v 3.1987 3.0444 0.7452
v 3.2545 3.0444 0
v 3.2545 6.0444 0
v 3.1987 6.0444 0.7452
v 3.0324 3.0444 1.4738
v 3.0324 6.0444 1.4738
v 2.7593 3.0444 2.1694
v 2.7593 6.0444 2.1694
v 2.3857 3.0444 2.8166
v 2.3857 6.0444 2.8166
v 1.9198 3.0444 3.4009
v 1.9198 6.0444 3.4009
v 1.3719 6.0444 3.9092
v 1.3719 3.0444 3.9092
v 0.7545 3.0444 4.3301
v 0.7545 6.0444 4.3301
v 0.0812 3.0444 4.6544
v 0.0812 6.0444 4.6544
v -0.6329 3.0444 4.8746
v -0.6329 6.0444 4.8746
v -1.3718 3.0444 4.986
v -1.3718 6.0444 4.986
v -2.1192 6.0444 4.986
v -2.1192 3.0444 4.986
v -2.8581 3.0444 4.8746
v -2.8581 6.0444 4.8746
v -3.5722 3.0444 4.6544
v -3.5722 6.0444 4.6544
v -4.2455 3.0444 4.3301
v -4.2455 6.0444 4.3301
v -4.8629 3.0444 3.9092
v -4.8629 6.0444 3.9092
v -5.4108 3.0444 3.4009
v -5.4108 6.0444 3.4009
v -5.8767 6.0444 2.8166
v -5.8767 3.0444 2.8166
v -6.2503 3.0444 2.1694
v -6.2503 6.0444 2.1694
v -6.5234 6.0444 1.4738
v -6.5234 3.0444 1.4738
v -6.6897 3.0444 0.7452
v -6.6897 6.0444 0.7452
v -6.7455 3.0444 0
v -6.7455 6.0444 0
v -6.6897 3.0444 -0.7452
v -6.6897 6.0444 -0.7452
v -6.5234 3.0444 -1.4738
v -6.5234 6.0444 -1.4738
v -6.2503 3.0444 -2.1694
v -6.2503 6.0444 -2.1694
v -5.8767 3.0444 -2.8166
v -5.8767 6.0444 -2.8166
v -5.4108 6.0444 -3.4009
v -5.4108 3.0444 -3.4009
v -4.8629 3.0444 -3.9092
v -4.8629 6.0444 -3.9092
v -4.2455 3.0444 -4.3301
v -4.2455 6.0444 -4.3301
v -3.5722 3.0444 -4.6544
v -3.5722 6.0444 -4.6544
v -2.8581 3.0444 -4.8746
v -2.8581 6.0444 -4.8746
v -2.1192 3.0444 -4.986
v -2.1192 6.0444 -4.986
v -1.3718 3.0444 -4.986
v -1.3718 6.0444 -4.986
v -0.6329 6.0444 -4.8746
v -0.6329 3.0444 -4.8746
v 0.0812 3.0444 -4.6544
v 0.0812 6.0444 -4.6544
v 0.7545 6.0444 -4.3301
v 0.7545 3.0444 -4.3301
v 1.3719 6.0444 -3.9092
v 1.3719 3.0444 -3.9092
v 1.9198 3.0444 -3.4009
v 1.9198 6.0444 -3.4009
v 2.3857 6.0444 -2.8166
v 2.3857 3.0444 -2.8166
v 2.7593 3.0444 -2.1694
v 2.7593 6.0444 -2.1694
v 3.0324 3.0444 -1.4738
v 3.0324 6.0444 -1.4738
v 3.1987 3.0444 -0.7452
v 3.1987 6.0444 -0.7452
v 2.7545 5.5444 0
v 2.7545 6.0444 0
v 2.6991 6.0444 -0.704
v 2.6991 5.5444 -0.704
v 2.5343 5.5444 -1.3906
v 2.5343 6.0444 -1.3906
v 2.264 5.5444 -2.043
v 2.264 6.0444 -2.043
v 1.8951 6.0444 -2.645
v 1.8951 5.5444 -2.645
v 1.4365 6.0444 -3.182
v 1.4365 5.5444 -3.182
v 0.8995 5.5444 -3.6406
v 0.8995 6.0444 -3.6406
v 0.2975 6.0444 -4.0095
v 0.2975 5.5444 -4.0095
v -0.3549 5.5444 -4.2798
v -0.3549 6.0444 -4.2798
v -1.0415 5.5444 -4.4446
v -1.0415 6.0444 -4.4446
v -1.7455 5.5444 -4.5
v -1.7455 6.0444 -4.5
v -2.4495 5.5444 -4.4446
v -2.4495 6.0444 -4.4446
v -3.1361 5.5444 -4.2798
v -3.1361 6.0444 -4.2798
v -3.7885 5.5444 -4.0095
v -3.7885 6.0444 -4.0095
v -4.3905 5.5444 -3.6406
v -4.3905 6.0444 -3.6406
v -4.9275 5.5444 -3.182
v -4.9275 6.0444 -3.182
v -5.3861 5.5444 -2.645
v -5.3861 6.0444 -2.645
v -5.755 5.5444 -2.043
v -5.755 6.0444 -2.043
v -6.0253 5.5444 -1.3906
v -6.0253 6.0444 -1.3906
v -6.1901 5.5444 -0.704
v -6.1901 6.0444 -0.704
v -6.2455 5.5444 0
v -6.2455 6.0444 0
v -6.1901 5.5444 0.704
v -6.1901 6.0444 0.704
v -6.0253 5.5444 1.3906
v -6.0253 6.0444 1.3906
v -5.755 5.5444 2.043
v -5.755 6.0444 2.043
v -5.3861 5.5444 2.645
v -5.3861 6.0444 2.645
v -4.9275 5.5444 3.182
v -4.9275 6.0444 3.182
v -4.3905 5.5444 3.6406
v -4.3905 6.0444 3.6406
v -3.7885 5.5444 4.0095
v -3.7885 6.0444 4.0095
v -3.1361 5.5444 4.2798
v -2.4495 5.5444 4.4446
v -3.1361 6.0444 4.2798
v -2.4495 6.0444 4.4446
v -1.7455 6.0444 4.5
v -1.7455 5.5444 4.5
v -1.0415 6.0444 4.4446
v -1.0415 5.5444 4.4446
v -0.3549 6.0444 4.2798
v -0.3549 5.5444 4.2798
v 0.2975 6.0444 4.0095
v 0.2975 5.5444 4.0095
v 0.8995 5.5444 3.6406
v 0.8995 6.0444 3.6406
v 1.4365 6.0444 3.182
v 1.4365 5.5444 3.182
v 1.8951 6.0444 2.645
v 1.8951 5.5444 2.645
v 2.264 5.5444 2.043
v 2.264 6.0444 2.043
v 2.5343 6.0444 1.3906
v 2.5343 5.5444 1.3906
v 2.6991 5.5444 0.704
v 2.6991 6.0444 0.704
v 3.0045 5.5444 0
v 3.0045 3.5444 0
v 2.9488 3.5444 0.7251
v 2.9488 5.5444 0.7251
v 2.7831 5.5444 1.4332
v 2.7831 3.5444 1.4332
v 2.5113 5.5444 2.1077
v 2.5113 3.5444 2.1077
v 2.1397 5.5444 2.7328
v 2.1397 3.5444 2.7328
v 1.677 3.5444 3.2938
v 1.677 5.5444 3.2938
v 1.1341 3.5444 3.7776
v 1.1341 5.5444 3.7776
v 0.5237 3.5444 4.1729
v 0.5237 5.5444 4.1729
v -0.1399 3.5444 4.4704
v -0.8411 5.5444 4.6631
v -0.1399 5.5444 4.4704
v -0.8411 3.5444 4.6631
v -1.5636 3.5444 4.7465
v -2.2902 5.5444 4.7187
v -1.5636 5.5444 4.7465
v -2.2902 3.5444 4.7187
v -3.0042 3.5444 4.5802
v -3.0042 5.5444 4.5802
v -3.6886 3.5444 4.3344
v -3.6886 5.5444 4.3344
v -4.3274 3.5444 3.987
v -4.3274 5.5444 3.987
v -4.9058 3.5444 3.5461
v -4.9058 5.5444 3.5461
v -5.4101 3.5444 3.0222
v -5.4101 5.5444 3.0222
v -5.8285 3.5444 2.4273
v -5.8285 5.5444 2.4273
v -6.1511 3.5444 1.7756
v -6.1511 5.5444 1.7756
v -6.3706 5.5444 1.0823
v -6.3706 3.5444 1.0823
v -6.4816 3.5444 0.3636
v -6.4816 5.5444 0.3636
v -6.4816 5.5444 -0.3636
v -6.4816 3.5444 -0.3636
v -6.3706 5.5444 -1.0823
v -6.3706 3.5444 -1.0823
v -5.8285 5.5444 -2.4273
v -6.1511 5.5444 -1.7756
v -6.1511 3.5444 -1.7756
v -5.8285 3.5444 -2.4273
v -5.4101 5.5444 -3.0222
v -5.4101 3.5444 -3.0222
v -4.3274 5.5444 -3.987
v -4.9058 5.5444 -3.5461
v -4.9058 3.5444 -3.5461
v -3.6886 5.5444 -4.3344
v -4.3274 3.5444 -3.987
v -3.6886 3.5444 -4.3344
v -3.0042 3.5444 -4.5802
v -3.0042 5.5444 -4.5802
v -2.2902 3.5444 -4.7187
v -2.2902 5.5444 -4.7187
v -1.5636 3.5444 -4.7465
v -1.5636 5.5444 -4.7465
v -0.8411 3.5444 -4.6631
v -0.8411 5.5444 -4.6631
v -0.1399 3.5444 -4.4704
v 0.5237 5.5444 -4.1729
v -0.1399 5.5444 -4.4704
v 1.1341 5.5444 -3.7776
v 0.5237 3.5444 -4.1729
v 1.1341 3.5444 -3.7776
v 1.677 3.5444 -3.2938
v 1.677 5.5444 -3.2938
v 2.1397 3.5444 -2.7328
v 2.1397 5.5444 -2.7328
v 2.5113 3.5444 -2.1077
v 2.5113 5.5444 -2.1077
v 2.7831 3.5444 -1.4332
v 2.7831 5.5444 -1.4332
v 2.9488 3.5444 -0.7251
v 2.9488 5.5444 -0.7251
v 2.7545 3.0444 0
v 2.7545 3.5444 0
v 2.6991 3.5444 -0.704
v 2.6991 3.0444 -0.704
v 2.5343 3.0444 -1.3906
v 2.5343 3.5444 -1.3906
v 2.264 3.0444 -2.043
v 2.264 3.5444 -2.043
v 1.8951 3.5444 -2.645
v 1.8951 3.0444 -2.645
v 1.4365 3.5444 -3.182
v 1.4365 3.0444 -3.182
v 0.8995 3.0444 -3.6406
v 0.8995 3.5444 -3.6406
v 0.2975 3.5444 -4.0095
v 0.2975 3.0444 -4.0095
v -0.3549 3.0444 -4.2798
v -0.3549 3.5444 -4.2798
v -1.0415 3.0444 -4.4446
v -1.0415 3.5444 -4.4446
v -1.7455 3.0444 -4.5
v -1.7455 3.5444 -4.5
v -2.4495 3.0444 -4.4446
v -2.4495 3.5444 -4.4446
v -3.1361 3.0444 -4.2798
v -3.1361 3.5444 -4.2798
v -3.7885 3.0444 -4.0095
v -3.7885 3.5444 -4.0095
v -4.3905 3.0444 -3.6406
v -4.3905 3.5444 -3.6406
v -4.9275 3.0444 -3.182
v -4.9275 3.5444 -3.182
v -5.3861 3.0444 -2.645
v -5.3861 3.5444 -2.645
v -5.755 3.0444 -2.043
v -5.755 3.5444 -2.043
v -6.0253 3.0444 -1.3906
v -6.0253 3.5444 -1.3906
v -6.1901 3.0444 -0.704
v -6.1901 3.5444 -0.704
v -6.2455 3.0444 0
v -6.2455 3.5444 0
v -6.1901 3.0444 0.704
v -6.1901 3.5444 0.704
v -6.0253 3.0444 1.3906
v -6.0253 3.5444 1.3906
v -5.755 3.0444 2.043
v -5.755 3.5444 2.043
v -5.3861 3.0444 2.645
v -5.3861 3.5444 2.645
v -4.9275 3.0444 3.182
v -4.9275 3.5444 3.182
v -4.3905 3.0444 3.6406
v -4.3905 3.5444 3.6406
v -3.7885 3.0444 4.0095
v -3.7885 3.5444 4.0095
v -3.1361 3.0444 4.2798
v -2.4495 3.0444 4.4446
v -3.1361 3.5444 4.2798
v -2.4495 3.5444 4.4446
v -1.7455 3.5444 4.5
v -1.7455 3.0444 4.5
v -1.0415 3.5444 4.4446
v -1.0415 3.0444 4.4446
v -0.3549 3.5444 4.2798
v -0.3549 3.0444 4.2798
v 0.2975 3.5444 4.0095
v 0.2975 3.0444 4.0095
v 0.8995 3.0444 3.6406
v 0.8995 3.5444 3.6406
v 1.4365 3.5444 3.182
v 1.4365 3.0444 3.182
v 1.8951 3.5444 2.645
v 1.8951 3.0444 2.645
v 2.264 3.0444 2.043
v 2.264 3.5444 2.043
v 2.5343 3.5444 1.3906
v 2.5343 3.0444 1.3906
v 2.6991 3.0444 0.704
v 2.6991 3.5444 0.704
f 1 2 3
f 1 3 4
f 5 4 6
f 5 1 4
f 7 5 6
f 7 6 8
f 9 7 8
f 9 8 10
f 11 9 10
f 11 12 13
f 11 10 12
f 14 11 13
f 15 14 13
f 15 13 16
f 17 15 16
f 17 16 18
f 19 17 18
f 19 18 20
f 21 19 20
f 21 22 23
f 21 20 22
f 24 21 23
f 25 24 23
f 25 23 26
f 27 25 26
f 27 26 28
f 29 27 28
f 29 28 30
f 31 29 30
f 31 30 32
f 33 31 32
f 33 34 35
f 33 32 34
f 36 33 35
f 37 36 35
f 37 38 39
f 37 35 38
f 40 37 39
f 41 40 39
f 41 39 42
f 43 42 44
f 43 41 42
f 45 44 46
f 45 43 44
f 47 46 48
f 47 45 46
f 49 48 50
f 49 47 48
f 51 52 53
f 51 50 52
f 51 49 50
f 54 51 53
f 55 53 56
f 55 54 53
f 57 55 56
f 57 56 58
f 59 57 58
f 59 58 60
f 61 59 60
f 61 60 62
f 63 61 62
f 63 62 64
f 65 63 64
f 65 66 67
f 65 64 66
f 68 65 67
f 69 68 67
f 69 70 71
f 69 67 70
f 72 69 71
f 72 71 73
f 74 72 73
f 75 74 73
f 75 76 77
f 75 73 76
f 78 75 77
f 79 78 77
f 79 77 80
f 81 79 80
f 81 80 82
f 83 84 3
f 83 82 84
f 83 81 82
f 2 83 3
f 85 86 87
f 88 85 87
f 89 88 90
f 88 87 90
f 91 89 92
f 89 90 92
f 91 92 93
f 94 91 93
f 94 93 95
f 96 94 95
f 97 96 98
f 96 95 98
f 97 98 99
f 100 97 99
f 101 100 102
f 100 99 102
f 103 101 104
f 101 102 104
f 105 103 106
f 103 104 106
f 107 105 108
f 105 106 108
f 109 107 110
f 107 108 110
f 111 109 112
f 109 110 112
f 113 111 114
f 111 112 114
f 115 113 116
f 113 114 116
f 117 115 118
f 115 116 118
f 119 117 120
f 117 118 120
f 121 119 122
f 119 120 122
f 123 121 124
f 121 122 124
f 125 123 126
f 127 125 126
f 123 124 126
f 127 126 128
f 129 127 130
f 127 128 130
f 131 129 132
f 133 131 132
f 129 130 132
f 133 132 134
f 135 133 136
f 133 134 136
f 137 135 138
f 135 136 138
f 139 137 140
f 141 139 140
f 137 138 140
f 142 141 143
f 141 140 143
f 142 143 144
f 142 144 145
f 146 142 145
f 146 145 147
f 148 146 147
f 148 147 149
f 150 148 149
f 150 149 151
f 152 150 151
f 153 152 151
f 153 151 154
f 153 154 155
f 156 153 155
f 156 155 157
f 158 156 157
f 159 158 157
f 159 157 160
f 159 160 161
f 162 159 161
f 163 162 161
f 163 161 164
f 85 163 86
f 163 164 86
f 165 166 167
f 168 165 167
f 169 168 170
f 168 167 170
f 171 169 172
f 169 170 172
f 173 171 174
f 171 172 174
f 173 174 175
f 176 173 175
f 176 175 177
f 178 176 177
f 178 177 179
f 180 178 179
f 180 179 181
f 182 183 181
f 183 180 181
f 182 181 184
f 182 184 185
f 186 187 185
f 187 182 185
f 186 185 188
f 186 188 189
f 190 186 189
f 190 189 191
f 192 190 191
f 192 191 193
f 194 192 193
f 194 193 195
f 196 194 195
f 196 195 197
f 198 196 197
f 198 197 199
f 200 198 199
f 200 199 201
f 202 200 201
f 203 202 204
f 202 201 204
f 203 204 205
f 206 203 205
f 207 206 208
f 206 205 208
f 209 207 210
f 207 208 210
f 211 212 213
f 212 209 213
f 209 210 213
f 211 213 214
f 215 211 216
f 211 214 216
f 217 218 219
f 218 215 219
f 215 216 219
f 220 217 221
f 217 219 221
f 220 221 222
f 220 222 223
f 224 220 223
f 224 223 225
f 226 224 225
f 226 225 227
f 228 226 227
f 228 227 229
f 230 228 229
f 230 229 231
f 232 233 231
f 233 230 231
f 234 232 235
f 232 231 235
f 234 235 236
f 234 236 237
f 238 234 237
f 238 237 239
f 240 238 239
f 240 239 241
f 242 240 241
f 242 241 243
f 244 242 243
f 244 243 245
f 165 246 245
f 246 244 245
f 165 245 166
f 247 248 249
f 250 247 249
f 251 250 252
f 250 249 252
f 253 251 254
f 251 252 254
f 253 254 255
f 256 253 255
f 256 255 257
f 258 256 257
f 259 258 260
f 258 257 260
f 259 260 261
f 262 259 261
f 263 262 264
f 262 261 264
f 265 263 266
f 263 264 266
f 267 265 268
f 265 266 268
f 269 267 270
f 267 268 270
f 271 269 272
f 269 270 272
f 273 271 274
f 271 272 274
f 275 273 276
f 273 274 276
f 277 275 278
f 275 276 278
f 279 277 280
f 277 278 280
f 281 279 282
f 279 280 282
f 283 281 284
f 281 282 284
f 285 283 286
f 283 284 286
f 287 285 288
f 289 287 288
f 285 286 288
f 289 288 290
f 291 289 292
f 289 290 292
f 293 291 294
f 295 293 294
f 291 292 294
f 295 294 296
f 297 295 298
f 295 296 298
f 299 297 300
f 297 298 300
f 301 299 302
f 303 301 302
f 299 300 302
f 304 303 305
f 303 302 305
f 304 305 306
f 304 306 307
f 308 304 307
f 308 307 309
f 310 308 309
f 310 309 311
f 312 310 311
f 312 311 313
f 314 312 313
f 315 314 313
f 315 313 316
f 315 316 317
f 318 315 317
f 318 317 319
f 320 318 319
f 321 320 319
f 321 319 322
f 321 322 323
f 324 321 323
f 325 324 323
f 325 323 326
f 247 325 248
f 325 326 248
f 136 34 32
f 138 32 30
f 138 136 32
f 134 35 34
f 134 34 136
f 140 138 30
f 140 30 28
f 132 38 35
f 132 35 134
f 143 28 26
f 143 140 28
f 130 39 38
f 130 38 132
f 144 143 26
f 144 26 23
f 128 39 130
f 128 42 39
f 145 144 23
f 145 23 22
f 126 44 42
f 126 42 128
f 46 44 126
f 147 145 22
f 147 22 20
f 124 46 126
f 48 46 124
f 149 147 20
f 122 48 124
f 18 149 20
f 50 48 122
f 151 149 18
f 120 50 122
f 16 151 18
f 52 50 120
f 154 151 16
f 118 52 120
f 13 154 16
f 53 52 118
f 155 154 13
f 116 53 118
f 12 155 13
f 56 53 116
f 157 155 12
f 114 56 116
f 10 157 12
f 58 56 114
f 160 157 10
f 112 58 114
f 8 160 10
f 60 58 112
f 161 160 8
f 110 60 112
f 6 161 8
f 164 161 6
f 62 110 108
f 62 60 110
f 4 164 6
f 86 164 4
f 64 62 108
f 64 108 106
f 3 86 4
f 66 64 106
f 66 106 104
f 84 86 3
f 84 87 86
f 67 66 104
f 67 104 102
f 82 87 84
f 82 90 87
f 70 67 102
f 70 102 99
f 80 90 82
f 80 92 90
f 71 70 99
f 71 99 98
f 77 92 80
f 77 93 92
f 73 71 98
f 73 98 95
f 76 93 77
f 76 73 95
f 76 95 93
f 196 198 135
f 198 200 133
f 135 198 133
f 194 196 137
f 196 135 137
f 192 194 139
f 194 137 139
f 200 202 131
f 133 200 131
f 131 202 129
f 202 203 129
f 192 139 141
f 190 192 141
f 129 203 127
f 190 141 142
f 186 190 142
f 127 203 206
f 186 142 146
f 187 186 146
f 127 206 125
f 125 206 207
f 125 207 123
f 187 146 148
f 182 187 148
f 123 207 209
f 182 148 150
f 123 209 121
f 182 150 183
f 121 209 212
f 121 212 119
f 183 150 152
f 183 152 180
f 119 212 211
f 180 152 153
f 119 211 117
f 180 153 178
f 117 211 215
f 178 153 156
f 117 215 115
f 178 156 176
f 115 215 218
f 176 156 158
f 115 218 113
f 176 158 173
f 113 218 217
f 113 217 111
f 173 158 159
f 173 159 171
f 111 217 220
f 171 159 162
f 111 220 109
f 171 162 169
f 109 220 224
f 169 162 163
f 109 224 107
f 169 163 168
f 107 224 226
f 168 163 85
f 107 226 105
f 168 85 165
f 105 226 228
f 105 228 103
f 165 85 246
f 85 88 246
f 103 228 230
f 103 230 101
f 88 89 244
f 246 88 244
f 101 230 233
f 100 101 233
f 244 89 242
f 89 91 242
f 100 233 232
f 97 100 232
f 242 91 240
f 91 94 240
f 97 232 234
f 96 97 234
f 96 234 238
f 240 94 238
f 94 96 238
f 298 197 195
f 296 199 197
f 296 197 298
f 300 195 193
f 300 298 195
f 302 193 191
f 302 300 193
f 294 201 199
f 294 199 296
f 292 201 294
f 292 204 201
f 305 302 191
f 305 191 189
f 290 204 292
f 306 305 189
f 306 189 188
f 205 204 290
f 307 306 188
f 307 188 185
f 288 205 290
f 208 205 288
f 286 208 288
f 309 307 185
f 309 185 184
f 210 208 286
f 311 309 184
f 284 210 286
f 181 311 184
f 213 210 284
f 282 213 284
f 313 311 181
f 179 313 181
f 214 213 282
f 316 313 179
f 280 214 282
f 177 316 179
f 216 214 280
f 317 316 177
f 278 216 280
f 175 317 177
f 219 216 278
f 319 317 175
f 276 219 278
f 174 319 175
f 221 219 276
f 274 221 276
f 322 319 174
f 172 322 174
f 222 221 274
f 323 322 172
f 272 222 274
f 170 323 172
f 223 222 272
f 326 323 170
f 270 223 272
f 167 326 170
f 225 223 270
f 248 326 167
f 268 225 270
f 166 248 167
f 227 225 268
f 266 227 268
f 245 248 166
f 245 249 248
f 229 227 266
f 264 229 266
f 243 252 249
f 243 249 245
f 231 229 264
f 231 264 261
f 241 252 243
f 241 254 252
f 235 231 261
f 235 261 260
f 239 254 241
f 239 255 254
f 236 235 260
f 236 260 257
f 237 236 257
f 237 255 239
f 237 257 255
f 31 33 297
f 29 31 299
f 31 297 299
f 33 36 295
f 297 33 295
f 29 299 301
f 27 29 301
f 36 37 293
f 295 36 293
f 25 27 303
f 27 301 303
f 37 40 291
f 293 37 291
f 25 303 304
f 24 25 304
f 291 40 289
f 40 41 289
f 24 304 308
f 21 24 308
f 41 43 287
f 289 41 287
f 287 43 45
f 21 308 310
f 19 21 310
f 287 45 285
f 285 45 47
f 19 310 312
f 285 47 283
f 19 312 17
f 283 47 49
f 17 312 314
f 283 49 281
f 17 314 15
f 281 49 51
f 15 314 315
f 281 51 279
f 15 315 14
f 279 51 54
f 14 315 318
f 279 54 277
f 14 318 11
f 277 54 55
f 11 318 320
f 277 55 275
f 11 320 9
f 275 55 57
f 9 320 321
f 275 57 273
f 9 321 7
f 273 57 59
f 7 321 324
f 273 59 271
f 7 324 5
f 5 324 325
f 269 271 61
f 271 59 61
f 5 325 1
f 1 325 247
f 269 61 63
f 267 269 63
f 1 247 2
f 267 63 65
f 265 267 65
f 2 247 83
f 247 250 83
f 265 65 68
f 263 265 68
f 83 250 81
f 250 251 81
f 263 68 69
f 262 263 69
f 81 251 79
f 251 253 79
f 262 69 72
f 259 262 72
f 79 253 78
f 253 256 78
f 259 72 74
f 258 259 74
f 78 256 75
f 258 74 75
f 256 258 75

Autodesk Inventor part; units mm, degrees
ref_plane "YZ Plane" through (0, 0, 0) normal (1, 0, 0) x (0, 1, 0)
ref_plane "XZ Plane" through (0, 0, 0) normal (0, 1, 0) x (-1, 0, 0)
ref_plane "XY Plane" through (0, 0, 0) normal (0, 0, 1) x (1, 0, 0)
sketch "Sketch1" plane through (0, 0, 0) normal (0, 0, 1) x (1, 0, 0)
  line L0 (-1.7455, 0) -> (-1.7455, 9.9919)
  line L1 (2.7545, 5.5444) -> (2.7545, 6.0444)
  line L2 (2.7545, 6.0444) -> (3.2545, 6.0444)
  line L3 (3.2545, 6.0444) -> (3.2545, 3.0444)
  line L4 (3.2545, 3.0444) -> (2.7545, 3.0444)
  line L5 (2.7545, 3.0444) -> (2.7545, 3.5444)
  line L6 (2.7545, 5.5444) -> (3.0045, 5.5444)
  line L7 (3.0045, 5.5444) -> (3.0045, 3.5444)
  line L8 (3.0045, 3.5444) -> (2.7545, 3.5444)
  dimension "d5" = 3
  dimension "d13" = 0.25
  dimension "d14" = 10
  dimension "d15" = 0.5
  dimension "d16" = 9.5
revolve "Revolution1" add sketch "Sketch1" angle 360 about axis through (-1.7455, 0, 0) along (0, 1, 0)
properties part number "Out"
